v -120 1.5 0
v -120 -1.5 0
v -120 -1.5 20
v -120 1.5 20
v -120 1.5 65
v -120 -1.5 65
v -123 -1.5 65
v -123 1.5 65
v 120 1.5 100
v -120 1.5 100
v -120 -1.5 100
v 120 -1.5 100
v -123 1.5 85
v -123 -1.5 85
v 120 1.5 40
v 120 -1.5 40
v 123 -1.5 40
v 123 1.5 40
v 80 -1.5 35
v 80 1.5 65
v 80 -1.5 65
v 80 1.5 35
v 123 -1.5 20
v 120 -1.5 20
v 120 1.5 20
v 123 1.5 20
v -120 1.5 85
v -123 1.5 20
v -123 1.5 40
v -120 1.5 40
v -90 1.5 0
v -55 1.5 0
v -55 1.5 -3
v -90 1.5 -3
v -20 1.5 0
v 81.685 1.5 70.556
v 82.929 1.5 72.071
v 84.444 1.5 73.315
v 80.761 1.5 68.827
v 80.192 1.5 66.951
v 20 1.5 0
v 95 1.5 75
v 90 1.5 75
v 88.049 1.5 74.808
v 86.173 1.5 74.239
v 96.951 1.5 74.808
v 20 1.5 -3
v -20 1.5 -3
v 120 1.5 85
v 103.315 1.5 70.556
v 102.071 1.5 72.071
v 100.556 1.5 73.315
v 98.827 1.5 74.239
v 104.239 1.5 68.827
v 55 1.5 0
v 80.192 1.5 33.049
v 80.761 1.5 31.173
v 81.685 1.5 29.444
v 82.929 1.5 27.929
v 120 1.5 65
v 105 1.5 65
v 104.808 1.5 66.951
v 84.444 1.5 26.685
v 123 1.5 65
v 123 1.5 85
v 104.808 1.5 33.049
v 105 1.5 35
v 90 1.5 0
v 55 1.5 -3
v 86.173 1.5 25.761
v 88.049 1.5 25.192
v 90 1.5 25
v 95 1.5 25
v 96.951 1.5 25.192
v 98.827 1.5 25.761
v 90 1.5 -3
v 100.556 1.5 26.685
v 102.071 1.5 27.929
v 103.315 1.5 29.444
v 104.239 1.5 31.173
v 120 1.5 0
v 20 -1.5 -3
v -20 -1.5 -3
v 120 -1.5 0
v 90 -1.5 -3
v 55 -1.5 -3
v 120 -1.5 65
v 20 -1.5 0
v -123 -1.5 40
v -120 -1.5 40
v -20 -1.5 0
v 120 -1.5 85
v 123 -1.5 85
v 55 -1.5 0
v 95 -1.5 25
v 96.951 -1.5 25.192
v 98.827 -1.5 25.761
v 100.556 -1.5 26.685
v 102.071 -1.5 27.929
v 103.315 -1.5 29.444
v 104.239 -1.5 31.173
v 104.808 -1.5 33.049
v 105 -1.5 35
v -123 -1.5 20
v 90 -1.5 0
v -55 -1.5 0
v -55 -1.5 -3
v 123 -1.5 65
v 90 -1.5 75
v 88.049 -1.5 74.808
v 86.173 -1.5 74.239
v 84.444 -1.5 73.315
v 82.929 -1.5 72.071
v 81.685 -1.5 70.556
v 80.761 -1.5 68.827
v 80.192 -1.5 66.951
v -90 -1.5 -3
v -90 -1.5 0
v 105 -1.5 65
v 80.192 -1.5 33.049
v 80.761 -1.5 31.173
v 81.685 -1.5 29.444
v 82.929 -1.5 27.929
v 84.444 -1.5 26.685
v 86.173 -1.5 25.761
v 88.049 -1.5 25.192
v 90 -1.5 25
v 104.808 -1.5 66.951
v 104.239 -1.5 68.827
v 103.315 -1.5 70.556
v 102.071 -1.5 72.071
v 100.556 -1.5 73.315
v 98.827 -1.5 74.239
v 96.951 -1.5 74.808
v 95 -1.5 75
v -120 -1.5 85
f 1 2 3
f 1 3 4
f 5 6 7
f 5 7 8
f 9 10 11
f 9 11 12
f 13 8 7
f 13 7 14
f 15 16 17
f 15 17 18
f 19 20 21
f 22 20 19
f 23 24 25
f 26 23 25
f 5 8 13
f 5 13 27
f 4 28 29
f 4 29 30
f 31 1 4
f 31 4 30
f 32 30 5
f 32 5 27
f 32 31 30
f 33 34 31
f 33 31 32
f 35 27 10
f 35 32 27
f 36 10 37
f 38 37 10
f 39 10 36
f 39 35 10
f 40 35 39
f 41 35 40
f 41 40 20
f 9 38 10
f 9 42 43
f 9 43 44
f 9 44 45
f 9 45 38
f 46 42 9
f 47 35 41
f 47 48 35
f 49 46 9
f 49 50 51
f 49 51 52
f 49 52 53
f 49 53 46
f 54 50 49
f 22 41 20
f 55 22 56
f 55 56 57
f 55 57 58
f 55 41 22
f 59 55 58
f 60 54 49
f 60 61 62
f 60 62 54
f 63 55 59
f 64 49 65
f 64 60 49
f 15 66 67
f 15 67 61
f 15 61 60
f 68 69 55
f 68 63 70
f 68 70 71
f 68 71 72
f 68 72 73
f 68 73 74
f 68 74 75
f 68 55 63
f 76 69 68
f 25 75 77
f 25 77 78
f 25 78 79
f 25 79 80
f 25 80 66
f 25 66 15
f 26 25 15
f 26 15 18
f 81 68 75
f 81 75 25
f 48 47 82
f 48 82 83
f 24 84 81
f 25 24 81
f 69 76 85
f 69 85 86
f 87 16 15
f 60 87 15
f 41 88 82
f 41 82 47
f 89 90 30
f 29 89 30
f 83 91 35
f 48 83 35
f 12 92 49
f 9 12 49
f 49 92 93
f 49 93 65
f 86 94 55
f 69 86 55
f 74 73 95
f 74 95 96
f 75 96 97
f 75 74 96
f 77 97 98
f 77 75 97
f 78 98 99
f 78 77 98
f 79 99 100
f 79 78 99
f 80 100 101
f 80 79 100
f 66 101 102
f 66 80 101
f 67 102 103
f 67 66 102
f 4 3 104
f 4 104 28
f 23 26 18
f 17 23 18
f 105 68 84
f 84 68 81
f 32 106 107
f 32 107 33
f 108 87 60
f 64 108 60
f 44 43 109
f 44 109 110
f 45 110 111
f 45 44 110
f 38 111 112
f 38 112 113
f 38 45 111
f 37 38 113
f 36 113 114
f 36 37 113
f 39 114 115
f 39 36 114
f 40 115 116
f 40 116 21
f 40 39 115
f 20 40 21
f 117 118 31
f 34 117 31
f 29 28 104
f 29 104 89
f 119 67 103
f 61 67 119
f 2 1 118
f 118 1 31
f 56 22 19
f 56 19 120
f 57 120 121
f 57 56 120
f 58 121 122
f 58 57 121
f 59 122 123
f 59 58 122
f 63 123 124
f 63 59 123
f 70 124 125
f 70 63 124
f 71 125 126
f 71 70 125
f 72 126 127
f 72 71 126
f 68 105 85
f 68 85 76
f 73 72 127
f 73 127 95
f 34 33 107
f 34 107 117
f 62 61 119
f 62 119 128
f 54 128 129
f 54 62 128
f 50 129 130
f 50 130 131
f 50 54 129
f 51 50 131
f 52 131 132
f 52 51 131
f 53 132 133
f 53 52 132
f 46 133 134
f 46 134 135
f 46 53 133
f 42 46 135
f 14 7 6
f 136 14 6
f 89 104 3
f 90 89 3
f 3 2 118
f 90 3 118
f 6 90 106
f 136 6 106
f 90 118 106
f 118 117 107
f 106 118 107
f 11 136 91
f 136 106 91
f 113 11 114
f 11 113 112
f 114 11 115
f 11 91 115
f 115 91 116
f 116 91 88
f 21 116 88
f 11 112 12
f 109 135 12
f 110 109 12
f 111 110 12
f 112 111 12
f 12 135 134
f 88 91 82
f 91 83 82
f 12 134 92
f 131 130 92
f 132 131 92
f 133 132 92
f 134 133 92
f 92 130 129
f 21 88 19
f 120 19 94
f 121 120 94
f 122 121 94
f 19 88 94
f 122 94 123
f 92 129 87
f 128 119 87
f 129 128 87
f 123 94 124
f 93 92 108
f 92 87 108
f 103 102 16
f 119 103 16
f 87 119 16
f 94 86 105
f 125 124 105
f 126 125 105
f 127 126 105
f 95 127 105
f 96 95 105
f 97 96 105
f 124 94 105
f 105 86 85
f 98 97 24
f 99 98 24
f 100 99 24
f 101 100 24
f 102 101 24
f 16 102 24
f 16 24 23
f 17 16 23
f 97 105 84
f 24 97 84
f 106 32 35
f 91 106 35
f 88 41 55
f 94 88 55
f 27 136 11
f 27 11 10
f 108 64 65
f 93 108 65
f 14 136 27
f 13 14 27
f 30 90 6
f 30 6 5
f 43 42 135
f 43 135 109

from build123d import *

# Parameters (mm, degrees)
SKETCH2_W           = 240
SKETCH2_H           = 3
BOSS_EXTRUDE1_DEPTH = 100
SKETCH3_W           = 20
SKETCH3_H           = 3
BOSS_EXTRUDE2_DEPTH = 3
BOSS_EXTRUDE3_START = -240
SKETCH3_2_W         = 20
SKETCH3_2_H         = 3
BOSS_EXTRUDE3_DEPTH = 3
SKETCH4_W           = 35
SKETCH4_H           = 3
SKETCH4_W_2         = 40
BOSS_EXTRUDE4_DEPTH = 3
CUT_EXTRUDE1_DEPTH  = 3


with BuildPart() as part:
    # Sketch2 → Boss-Extrude1 (new body)
    with BuildSketch(Plane.XY):
        Rectangle(SKETCH2_W, SKETCH2_H)
    extrude(amount=BOSS_EXTRUDE1_DEPTH)

    # Sketch3 → Boss-Extrude2 (add)
    with BuildSketch(Plane.ZY.offset(120)):
        with Locations((30, 0)):
            Rectangle(SKETCH3_W, SKETCH3_H)
        with Locations((75, 0)):
            Rectangle(SKETCH3_W, SKETCH3_H)
    extrude(amount=BOSS_EXTRUDE2_DEPTH)

    # Sketch3<2> → Boss-Extrude3 (add)
    with BuildSketch(Plane.ZY.offset(120).offset(BOSS_EXTRUDE3_START)):
        with Locations((30, 0)):
            Rectangle(SKETCH3_2_W, SKETCH3_2_H)
        with Locations((75, 0)):
            Rectangle(SKETCH3_2_W, SKETCH3_2_H)
    extrude(amount=-BOSS_EXTRUDE3_DEPTH)

    # Sketch4 → Boss-Extrude4 (add)
    with BuildSketch(Plane(origin=(0, 0, 0), x_dir=(-1, 0, 0), z_dir=(0, 0, -1))):
        with Locations((-72.5, 0)):
            Rectangle(SKETCH4_W, SKETCH4_H)
        Rectangle(SKETCH4_W_2, SKETCH4_H)
        with Locations((72.5, 0)):
            Rectangle(SKETCH4_W, SKETCH4_H)
    extrude(amount=BOSS_EXTRUDE4_DEPTH)

    # Sketch5 → Cut-Extrude1 (cut)
    with BuildSketch(Plane(origin=(0, 1.5, 0), x_dir=(1, 0, 0), z_dir=(0, 1, 0))):
        with BuildLine():
            Line((90, -25), (95, -25))
            ThreePointArc((95, -25), (102.071067812, -27.928932188), (105, -35))
            Line((105, -35), (105, -65))
            ThreePointArc((105, -65), (102.071067812, -72.071067812), (95, -75))
            Line((95, -75), (90, -75))
            ThreePointArc((90, -75), (82.928932188, -72.071067812), (80, -65))
            Line((80, -65), (80, -35))
            ThreePointArc((80, -35), (82.928932188, -27.928932188), (90, -25))
        make_face()
    extrude(amount=-CUT_EXTRUDE1_DEPTH, mode=Mode.SUBTRACT)


solid = part.part
